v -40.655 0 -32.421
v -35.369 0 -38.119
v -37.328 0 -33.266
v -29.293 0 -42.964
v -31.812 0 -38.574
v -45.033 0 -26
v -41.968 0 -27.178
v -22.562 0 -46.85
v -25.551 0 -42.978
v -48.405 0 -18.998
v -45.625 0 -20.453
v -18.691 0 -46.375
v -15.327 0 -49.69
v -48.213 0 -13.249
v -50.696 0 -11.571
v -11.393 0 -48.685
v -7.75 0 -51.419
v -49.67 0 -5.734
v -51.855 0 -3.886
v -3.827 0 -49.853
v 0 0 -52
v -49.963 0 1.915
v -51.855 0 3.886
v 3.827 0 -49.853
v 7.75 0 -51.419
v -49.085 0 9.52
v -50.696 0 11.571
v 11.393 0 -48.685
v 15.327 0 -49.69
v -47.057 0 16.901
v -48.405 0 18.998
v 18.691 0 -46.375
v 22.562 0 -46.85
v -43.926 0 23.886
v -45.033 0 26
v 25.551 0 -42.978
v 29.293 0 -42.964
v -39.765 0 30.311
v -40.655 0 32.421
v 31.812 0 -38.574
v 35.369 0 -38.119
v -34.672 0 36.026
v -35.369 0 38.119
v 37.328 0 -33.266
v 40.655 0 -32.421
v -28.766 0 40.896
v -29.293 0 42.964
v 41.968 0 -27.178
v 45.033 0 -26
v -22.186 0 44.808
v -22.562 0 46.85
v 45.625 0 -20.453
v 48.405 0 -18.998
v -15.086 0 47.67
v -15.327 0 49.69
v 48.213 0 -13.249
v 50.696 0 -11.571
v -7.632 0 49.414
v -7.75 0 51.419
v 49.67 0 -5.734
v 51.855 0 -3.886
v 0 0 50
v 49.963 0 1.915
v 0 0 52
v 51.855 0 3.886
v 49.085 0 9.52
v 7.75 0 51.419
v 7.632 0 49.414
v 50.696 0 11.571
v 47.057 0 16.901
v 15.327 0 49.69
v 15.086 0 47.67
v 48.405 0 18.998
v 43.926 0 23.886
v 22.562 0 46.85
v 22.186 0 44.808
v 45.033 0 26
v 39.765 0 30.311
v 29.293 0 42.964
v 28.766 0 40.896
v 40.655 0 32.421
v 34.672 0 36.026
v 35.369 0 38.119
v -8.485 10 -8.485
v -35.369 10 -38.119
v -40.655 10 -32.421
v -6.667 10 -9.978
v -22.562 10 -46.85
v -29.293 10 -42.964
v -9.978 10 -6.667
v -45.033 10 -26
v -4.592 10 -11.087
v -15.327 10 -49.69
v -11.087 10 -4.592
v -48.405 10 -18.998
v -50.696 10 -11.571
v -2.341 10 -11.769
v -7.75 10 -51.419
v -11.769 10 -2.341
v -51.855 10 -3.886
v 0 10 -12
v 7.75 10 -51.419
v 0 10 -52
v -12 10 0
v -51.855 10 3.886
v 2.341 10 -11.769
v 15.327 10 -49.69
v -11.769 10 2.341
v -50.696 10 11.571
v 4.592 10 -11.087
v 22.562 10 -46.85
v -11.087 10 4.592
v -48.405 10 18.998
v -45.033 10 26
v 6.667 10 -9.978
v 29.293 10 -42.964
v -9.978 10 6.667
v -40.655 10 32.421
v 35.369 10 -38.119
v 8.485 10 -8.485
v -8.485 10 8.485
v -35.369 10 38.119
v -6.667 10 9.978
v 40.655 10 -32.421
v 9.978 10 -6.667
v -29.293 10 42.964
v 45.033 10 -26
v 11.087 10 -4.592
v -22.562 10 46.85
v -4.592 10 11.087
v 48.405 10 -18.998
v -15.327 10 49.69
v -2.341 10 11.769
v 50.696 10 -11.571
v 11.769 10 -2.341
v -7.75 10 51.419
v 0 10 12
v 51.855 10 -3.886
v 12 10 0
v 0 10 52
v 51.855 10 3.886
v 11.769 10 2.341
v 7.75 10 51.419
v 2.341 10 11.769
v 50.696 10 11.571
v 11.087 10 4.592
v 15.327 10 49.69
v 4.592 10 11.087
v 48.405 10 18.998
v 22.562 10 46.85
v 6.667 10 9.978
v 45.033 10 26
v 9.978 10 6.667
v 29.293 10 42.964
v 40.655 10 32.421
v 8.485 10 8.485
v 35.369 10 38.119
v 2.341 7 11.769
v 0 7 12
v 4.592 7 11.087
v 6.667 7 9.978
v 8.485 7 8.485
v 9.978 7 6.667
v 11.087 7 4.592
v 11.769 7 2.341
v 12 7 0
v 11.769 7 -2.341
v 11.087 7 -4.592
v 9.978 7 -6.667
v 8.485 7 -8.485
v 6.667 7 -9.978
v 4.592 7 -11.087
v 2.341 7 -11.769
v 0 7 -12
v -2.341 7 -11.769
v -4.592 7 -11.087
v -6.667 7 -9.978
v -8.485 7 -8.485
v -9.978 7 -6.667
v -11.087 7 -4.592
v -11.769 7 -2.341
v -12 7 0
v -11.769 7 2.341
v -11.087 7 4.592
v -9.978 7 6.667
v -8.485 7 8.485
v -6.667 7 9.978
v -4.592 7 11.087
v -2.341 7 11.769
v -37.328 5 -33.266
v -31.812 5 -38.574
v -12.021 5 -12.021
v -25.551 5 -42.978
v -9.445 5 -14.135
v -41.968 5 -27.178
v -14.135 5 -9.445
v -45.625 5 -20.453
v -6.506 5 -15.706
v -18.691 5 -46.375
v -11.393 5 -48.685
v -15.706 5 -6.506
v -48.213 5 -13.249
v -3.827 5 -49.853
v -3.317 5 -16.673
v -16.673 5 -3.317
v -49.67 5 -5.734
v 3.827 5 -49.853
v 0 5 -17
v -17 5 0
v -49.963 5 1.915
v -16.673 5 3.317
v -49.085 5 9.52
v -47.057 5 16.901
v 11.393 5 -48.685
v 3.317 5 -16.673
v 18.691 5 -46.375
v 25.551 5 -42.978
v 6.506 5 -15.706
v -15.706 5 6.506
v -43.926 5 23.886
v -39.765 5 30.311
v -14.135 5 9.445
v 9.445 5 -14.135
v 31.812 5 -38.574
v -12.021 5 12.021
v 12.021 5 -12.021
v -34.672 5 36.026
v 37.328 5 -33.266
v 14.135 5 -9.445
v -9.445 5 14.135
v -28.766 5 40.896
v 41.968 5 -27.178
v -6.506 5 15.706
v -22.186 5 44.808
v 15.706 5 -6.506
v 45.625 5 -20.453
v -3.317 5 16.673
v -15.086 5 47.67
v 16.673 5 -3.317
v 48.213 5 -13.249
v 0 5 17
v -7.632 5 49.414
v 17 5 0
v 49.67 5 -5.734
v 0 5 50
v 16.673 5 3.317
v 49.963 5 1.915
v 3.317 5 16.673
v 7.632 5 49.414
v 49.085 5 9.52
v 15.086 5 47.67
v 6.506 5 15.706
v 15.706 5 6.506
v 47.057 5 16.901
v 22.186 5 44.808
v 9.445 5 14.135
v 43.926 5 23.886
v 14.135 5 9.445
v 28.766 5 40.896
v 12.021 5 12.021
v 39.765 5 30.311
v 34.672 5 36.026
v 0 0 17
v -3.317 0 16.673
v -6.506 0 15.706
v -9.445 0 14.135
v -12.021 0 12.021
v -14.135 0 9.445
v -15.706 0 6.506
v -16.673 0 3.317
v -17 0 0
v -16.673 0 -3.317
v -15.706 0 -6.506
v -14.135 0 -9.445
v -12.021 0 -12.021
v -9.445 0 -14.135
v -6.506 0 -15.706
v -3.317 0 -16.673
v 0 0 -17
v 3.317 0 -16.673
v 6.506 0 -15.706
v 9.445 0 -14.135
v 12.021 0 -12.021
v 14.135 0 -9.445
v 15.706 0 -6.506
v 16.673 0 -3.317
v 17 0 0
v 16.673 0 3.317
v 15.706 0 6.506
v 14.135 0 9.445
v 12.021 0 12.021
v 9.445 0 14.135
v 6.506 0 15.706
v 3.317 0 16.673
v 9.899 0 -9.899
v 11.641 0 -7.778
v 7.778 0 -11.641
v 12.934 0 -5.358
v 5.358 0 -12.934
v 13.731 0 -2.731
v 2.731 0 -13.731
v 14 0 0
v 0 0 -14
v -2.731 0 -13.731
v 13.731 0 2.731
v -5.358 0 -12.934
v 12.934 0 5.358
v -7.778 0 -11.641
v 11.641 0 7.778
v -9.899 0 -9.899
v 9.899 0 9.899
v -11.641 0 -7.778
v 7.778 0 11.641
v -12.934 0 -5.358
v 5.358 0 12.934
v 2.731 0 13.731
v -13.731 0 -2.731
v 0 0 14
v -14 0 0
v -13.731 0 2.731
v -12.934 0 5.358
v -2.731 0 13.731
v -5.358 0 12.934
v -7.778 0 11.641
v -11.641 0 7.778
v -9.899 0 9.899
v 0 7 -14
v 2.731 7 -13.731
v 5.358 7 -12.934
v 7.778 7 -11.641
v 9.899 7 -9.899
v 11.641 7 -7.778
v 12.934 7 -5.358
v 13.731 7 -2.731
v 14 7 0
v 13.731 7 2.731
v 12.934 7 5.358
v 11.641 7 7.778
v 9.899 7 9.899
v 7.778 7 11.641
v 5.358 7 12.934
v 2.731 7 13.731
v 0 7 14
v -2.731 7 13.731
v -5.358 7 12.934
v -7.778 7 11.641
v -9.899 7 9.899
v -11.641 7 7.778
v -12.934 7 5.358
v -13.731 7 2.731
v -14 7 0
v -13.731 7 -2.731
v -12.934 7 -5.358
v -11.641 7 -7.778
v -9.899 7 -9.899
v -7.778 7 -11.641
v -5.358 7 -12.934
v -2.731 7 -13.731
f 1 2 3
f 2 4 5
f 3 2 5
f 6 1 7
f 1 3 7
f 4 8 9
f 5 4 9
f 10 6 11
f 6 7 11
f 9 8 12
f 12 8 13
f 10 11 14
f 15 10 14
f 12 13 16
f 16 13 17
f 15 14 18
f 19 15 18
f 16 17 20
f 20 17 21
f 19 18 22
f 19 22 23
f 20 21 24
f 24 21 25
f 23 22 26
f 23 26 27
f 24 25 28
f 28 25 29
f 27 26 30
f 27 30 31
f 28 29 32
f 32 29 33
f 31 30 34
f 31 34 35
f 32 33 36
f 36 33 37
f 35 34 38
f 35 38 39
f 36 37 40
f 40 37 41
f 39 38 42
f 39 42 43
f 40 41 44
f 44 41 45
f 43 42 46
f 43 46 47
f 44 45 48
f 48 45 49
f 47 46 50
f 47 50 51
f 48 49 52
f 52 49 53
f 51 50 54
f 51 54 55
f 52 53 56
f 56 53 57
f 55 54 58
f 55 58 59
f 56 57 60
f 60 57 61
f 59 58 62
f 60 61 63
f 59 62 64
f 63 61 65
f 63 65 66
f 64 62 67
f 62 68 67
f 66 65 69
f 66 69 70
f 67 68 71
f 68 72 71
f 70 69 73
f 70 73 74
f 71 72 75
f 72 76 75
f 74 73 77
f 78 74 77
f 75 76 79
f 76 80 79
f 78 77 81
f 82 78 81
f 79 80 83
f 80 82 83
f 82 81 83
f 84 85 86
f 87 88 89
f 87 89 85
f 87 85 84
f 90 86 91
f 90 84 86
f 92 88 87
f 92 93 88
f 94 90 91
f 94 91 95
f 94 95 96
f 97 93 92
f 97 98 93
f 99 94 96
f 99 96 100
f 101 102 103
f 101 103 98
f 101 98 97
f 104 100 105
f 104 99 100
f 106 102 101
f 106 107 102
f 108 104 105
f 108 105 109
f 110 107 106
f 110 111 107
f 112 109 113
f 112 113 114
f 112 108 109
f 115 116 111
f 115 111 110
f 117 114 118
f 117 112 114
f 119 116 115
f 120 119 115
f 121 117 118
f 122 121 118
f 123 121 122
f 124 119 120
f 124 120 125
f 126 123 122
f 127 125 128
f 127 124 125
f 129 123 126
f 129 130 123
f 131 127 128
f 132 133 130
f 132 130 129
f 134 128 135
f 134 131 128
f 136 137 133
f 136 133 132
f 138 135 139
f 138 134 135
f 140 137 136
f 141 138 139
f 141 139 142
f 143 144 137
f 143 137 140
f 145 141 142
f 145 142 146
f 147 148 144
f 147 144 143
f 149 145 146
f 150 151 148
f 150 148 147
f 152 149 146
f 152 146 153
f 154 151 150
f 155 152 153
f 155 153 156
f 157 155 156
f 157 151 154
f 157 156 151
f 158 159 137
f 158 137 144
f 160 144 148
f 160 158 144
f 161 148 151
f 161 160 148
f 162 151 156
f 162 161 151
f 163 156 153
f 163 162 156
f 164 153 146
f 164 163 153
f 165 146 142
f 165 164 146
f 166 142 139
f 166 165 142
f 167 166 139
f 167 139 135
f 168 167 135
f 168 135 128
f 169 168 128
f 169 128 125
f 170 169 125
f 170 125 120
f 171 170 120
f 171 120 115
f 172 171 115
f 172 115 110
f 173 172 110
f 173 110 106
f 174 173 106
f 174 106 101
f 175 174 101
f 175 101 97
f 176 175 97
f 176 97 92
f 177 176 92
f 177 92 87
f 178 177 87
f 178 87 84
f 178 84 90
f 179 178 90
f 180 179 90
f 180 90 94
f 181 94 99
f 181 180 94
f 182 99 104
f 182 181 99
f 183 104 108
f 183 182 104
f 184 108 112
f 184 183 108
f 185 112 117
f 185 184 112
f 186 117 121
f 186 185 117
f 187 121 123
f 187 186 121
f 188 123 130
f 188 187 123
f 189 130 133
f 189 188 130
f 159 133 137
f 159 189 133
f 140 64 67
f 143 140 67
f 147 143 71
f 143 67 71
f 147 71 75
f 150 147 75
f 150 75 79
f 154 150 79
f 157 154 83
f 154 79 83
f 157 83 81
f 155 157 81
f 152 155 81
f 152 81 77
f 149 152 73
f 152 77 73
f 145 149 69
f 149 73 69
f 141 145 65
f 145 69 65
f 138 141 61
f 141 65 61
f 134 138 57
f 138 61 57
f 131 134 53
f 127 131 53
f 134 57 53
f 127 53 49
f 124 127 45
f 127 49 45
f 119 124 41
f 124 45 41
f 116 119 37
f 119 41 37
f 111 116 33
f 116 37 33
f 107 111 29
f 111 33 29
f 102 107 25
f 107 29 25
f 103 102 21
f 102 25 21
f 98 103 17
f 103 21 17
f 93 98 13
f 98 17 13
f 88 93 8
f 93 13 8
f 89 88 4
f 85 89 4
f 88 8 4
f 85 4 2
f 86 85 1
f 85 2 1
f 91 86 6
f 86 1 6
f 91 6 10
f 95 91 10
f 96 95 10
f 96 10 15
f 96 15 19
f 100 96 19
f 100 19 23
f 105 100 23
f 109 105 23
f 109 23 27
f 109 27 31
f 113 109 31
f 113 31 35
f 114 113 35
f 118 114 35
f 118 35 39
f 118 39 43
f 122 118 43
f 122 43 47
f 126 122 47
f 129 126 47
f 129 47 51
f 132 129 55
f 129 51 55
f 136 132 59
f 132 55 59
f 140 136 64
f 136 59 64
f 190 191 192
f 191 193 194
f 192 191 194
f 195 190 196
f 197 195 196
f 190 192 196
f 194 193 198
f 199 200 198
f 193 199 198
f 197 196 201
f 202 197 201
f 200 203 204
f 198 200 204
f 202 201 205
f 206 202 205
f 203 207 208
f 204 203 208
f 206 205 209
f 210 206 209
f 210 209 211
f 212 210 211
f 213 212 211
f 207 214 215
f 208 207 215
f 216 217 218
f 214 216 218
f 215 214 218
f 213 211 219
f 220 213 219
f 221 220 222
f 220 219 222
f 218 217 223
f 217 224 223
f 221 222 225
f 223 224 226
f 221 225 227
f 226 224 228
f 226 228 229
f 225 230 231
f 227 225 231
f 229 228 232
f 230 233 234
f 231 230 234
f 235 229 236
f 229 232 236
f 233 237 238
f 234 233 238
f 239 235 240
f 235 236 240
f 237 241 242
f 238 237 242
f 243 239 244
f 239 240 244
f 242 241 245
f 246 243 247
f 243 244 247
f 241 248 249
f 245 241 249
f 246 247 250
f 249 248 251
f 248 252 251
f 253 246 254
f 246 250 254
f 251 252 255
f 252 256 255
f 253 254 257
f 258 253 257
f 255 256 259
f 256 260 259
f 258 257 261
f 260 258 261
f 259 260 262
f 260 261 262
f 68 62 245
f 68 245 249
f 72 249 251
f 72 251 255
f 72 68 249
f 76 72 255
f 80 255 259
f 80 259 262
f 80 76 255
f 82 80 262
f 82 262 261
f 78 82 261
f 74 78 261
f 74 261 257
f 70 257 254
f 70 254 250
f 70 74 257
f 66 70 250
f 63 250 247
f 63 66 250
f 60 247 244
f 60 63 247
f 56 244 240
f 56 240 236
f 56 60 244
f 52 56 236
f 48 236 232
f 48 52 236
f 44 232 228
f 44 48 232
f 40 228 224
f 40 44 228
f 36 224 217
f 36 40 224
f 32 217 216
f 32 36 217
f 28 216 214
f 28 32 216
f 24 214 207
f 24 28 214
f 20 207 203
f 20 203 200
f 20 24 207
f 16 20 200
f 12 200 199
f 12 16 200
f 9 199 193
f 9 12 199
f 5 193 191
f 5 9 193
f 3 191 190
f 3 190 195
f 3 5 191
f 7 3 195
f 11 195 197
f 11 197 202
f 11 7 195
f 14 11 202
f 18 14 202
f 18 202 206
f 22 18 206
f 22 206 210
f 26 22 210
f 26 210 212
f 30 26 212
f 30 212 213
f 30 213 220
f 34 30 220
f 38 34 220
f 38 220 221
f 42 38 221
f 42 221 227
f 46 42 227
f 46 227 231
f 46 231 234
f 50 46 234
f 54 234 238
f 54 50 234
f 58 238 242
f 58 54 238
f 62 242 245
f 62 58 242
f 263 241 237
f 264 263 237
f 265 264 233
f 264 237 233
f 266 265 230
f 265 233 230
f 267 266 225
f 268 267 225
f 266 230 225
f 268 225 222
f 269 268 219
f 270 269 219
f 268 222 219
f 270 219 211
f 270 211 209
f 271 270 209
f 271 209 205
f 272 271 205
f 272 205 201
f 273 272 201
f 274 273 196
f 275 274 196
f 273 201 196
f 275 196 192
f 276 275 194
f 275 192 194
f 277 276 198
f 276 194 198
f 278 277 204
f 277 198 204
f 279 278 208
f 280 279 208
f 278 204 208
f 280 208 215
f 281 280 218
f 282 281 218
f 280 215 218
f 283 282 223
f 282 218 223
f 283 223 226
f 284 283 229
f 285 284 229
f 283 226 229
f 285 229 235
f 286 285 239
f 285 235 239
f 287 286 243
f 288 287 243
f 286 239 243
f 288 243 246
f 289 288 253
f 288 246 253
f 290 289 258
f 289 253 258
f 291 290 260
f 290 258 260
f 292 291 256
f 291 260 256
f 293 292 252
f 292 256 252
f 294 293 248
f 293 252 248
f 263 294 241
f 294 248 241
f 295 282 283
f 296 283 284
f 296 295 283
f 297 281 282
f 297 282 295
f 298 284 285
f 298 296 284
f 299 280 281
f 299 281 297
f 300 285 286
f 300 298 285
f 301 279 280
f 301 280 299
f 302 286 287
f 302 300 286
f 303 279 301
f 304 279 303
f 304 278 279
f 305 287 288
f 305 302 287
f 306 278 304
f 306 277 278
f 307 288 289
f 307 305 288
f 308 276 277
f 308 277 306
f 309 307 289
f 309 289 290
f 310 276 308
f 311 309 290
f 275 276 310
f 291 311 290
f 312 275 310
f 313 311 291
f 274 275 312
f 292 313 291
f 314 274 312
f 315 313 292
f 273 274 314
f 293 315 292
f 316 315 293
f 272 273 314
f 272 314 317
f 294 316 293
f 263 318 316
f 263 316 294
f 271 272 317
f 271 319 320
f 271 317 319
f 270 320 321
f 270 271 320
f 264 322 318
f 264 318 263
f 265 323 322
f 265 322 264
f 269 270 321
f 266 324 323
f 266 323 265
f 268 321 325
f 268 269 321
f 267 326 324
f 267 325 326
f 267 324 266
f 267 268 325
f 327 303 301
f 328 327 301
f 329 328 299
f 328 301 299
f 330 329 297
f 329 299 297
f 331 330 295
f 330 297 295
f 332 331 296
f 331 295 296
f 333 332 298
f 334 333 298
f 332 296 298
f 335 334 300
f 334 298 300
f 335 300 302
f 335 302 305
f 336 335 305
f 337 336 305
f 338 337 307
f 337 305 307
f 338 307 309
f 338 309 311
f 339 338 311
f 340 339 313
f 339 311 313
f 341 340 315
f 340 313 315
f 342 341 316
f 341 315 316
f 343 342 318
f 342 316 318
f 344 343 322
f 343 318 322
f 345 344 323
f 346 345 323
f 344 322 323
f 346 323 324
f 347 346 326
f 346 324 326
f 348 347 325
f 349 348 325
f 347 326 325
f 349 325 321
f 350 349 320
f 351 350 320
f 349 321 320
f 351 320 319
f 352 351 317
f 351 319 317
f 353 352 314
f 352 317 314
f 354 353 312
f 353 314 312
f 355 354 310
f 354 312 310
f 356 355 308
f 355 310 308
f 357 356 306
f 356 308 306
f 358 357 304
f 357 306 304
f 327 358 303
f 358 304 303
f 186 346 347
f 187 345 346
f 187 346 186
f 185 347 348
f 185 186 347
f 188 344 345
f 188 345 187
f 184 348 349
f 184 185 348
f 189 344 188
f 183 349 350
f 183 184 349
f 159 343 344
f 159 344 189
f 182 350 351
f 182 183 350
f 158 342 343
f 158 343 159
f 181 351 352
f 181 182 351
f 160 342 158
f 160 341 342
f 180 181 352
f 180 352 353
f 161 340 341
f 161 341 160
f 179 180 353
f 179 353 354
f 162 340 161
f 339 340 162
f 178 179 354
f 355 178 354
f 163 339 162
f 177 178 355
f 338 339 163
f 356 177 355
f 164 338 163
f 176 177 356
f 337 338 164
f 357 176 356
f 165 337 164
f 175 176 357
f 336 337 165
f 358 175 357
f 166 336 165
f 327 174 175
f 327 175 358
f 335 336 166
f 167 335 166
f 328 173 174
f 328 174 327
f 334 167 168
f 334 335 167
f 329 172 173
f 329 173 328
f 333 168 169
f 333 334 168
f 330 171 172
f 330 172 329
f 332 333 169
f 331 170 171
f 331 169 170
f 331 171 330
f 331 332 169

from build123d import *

# Parameters (mm, degrees)
SKETCH1_R           = 52
BOSS_EXTRUDE1_DEPTH = 10
SKETCH2_R           = 50
CUT_EXTRUDE4_DEPTH  = 5
SKETCH3_R           = 12
CUT_EXTRUDE7_DEPTH  = 10
SKETCH4_R           = 17
BOSS_EXTRUDE2_DEPTH = 5
SKETCH5_R           = 14
CUT_EXTRUDE8_DEPTH  = 7


with BuildPart() as part:
    # Sketch1 → Boss-Extrude1 (new body)
    with BuildSketch(Plane(origin=(0, 0, 0), x_dir=(1, 0, 0), z_dir=(0, 1, 0))):
        with Locations(Location((0, 0, 0), (0, 0, 270))):
            Circle(SKETCH1_R)
    extrude(amount=BOSS_EXTRUDE1_DEPTH)

    # Sketch2 → Cut-Extrude4 (cut)
    with BuildSketch(Plane(origin=(0, 0, 0), x_dir=(1, 0, 0), z_dir=(0, 1, 0))):
        with Locations(Location((0, 0, 0), (0, 0, 270))):
            Circle(SKETCH2_R)
    extrude(amount=CUT_EXTRUDE4_DEPTH, mode=Mode.SUBTRACT)

    # Sketch3 → Cut-Extrude7 (cut)
    with BuildSketch(Plane(origin=(0, 0, 0), x_dir=(1, 0, 0), z_dir=(0, 1, 0))):
        with Locations(Location((0, 0, 0), (0, 0, 270))):
            Circle(SKETCH3_R)
    extrude(amount=CUT_EXTRUDE7_DEPTH, mode=Mode.SUBTRACT)

    # Sketch4 → Boss-Extrude2 (add)
    with BuildSketch(Plane.XZ.offset(-5)):
        with Locations(Location((0, 0, 0), (0, 0, 90))):
            Circle(SKETCH4_R)
    extrude(amount=BOSS_EXTRUDE2_DEPTH)

    # Sketch5 → Cut-Extrude8 (cut)
    with BuildSketch(Plane.XZ):
        with Locations(Location((0, 0, 0), (0, 0, 270))):
            Circle(SKETCH5_R)
    extrude(amount=-CUT_EXTRUDE8_DEPTH, mode=Mode.SUBTRACT)


solid = part.part
